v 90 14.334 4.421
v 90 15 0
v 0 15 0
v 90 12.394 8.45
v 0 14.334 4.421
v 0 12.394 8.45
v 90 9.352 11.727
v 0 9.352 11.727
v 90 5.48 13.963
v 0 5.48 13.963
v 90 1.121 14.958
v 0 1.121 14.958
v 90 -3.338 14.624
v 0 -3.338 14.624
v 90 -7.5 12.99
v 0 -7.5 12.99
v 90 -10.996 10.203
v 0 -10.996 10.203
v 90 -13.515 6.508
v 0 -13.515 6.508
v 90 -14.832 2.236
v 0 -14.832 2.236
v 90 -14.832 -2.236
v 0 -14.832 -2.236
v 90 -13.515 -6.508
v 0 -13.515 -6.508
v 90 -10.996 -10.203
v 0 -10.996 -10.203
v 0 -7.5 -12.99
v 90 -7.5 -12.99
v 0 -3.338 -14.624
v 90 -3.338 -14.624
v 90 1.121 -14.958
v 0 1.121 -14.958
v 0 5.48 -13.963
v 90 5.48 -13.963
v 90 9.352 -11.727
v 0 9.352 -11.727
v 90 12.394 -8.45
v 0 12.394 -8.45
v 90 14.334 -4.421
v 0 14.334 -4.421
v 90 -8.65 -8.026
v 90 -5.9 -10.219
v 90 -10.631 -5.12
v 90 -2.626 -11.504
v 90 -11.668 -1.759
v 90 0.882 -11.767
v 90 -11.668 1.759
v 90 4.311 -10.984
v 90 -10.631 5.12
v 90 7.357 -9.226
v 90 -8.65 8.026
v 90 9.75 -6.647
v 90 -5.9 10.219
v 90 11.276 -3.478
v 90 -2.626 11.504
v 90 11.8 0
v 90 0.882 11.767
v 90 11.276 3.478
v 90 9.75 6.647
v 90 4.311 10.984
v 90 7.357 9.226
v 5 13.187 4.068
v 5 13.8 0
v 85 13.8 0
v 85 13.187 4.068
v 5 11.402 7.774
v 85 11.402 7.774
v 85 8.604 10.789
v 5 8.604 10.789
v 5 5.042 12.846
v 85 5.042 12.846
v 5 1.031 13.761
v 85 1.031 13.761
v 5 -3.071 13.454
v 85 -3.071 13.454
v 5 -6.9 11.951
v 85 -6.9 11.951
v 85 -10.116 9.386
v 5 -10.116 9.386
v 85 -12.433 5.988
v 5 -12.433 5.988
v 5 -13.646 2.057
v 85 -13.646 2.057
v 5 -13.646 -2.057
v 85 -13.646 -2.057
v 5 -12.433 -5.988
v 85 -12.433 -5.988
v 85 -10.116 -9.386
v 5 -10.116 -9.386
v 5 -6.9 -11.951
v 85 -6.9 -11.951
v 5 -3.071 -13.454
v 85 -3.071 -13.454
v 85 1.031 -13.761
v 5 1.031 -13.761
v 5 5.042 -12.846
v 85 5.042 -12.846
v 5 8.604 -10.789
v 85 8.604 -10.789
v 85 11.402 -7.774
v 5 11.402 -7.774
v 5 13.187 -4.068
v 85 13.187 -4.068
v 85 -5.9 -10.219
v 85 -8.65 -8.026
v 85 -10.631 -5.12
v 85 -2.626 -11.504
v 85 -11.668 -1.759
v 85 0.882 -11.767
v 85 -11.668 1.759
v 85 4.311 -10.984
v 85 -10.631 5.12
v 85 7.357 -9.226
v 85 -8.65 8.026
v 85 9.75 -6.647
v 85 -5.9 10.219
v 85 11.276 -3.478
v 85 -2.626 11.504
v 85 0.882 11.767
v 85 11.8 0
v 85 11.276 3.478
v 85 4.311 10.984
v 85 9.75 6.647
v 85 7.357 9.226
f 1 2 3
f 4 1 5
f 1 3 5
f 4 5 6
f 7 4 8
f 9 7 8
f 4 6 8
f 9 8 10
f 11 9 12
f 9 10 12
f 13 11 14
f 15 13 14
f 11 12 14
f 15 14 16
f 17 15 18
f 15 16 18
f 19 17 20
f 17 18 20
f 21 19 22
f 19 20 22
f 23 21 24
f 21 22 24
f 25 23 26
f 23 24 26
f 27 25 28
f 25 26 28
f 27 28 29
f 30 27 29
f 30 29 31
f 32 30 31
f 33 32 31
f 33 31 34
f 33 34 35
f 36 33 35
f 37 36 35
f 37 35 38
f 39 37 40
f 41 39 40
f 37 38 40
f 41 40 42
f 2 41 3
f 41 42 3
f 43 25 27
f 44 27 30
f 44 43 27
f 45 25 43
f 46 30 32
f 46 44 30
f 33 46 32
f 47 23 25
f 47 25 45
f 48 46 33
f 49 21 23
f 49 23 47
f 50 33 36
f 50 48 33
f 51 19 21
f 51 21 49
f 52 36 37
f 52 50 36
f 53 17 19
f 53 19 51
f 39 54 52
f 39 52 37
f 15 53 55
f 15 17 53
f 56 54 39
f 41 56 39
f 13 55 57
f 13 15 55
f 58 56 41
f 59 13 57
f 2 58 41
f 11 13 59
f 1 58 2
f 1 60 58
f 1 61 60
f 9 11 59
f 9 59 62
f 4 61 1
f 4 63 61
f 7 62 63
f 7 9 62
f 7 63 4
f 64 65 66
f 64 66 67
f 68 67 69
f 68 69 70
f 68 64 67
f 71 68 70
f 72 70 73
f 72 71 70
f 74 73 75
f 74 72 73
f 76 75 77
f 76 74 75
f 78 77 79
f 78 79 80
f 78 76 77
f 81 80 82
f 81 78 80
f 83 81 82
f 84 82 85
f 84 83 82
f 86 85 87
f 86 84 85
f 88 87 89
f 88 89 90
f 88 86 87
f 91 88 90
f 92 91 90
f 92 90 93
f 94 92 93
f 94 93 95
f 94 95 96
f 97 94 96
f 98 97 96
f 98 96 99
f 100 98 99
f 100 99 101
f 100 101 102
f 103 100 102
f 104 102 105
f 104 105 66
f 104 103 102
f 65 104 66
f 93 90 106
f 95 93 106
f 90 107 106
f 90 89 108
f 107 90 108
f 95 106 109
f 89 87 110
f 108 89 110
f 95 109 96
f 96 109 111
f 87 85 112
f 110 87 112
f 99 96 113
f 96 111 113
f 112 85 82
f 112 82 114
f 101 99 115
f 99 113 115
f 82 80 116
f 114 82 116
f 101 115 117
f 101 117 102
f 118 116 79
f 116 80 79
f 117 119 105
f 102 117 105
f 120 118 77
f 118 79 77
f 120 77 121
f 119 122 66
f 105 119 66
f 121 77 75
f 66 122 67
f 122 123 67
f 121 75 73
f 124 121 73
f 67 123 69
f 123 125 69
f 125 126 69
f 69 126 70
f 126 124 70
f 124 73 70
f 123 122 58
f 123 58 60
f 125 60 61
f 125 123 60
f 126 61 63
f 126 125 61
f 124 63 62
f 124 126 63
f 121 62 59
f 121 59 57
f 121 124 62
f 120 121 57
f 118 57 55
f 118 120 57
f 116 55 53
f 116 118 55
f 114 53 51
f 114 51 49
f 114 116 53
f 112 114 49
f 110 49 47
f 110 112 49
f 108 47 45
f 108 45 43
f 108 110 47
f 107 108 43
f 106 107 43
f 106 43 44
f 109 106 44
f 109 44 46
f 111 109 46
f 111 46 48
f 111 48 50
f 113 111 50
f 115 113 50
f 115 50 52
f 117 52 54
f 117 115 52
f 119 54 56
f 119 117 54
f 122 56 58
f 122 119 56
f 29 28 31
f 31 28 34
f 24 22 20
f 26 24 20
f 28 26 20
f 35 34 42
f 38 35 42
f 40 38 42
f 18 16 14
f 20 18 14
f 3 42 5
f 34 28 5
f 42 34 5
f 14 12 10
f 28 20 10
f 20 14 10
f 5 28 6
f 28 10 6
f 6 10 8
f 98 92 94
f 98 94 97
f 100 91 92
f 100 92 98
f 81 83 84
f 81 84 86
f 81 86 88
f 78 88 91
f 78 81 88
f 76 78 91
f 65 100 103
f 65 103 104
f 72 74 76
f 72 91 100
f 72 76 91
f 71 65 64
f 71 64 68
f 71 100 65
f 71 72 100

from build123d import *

# Parameters (mm, degrees)
F0_R     = 15
F0_R_2   = 13.8
F1_DEPTH = 5
F2_R     = 15
F2_R_2   = 13.8
F3_DEPTH = 80
F4_R     = 15
F4_R_2   = 13.8
F4_R_3   = 11.8
F5_DEPTH = 5


with BuildPart() as f1:
    # F0 (on Right) → F1 (new body)
    with BuildSketch(Plane.YZ):
        Circle(F0_R)
        Circle(F0_R_2, mode=Mode.SUBTRACT)
        Circle(F0_R_2)
    extrude(amount=F1_DEPTH)

    # F2 (on face) → F3 (join)
    with BuildSketch(Plane.YZ.offset(5)):
        Circle(F2_R)
        Circle(F2_R_2, mode=Mode.SUBTRACT)
    extrude(amount=F3_DEPTH)

    # F4 (on face) → F5 (join)
    with BuildSketch(Plane.YZ.offset(85)):
        Circle(F4_R)
        Circle(F4_R_2, mode=Mode.SUBTRACT)
        Circle(F4_R_2)
        Circle(F4_R_3, mode=Mode.SUBTRACT)
    extrude(amount=F5_DEPTH)


solid = f1.part
